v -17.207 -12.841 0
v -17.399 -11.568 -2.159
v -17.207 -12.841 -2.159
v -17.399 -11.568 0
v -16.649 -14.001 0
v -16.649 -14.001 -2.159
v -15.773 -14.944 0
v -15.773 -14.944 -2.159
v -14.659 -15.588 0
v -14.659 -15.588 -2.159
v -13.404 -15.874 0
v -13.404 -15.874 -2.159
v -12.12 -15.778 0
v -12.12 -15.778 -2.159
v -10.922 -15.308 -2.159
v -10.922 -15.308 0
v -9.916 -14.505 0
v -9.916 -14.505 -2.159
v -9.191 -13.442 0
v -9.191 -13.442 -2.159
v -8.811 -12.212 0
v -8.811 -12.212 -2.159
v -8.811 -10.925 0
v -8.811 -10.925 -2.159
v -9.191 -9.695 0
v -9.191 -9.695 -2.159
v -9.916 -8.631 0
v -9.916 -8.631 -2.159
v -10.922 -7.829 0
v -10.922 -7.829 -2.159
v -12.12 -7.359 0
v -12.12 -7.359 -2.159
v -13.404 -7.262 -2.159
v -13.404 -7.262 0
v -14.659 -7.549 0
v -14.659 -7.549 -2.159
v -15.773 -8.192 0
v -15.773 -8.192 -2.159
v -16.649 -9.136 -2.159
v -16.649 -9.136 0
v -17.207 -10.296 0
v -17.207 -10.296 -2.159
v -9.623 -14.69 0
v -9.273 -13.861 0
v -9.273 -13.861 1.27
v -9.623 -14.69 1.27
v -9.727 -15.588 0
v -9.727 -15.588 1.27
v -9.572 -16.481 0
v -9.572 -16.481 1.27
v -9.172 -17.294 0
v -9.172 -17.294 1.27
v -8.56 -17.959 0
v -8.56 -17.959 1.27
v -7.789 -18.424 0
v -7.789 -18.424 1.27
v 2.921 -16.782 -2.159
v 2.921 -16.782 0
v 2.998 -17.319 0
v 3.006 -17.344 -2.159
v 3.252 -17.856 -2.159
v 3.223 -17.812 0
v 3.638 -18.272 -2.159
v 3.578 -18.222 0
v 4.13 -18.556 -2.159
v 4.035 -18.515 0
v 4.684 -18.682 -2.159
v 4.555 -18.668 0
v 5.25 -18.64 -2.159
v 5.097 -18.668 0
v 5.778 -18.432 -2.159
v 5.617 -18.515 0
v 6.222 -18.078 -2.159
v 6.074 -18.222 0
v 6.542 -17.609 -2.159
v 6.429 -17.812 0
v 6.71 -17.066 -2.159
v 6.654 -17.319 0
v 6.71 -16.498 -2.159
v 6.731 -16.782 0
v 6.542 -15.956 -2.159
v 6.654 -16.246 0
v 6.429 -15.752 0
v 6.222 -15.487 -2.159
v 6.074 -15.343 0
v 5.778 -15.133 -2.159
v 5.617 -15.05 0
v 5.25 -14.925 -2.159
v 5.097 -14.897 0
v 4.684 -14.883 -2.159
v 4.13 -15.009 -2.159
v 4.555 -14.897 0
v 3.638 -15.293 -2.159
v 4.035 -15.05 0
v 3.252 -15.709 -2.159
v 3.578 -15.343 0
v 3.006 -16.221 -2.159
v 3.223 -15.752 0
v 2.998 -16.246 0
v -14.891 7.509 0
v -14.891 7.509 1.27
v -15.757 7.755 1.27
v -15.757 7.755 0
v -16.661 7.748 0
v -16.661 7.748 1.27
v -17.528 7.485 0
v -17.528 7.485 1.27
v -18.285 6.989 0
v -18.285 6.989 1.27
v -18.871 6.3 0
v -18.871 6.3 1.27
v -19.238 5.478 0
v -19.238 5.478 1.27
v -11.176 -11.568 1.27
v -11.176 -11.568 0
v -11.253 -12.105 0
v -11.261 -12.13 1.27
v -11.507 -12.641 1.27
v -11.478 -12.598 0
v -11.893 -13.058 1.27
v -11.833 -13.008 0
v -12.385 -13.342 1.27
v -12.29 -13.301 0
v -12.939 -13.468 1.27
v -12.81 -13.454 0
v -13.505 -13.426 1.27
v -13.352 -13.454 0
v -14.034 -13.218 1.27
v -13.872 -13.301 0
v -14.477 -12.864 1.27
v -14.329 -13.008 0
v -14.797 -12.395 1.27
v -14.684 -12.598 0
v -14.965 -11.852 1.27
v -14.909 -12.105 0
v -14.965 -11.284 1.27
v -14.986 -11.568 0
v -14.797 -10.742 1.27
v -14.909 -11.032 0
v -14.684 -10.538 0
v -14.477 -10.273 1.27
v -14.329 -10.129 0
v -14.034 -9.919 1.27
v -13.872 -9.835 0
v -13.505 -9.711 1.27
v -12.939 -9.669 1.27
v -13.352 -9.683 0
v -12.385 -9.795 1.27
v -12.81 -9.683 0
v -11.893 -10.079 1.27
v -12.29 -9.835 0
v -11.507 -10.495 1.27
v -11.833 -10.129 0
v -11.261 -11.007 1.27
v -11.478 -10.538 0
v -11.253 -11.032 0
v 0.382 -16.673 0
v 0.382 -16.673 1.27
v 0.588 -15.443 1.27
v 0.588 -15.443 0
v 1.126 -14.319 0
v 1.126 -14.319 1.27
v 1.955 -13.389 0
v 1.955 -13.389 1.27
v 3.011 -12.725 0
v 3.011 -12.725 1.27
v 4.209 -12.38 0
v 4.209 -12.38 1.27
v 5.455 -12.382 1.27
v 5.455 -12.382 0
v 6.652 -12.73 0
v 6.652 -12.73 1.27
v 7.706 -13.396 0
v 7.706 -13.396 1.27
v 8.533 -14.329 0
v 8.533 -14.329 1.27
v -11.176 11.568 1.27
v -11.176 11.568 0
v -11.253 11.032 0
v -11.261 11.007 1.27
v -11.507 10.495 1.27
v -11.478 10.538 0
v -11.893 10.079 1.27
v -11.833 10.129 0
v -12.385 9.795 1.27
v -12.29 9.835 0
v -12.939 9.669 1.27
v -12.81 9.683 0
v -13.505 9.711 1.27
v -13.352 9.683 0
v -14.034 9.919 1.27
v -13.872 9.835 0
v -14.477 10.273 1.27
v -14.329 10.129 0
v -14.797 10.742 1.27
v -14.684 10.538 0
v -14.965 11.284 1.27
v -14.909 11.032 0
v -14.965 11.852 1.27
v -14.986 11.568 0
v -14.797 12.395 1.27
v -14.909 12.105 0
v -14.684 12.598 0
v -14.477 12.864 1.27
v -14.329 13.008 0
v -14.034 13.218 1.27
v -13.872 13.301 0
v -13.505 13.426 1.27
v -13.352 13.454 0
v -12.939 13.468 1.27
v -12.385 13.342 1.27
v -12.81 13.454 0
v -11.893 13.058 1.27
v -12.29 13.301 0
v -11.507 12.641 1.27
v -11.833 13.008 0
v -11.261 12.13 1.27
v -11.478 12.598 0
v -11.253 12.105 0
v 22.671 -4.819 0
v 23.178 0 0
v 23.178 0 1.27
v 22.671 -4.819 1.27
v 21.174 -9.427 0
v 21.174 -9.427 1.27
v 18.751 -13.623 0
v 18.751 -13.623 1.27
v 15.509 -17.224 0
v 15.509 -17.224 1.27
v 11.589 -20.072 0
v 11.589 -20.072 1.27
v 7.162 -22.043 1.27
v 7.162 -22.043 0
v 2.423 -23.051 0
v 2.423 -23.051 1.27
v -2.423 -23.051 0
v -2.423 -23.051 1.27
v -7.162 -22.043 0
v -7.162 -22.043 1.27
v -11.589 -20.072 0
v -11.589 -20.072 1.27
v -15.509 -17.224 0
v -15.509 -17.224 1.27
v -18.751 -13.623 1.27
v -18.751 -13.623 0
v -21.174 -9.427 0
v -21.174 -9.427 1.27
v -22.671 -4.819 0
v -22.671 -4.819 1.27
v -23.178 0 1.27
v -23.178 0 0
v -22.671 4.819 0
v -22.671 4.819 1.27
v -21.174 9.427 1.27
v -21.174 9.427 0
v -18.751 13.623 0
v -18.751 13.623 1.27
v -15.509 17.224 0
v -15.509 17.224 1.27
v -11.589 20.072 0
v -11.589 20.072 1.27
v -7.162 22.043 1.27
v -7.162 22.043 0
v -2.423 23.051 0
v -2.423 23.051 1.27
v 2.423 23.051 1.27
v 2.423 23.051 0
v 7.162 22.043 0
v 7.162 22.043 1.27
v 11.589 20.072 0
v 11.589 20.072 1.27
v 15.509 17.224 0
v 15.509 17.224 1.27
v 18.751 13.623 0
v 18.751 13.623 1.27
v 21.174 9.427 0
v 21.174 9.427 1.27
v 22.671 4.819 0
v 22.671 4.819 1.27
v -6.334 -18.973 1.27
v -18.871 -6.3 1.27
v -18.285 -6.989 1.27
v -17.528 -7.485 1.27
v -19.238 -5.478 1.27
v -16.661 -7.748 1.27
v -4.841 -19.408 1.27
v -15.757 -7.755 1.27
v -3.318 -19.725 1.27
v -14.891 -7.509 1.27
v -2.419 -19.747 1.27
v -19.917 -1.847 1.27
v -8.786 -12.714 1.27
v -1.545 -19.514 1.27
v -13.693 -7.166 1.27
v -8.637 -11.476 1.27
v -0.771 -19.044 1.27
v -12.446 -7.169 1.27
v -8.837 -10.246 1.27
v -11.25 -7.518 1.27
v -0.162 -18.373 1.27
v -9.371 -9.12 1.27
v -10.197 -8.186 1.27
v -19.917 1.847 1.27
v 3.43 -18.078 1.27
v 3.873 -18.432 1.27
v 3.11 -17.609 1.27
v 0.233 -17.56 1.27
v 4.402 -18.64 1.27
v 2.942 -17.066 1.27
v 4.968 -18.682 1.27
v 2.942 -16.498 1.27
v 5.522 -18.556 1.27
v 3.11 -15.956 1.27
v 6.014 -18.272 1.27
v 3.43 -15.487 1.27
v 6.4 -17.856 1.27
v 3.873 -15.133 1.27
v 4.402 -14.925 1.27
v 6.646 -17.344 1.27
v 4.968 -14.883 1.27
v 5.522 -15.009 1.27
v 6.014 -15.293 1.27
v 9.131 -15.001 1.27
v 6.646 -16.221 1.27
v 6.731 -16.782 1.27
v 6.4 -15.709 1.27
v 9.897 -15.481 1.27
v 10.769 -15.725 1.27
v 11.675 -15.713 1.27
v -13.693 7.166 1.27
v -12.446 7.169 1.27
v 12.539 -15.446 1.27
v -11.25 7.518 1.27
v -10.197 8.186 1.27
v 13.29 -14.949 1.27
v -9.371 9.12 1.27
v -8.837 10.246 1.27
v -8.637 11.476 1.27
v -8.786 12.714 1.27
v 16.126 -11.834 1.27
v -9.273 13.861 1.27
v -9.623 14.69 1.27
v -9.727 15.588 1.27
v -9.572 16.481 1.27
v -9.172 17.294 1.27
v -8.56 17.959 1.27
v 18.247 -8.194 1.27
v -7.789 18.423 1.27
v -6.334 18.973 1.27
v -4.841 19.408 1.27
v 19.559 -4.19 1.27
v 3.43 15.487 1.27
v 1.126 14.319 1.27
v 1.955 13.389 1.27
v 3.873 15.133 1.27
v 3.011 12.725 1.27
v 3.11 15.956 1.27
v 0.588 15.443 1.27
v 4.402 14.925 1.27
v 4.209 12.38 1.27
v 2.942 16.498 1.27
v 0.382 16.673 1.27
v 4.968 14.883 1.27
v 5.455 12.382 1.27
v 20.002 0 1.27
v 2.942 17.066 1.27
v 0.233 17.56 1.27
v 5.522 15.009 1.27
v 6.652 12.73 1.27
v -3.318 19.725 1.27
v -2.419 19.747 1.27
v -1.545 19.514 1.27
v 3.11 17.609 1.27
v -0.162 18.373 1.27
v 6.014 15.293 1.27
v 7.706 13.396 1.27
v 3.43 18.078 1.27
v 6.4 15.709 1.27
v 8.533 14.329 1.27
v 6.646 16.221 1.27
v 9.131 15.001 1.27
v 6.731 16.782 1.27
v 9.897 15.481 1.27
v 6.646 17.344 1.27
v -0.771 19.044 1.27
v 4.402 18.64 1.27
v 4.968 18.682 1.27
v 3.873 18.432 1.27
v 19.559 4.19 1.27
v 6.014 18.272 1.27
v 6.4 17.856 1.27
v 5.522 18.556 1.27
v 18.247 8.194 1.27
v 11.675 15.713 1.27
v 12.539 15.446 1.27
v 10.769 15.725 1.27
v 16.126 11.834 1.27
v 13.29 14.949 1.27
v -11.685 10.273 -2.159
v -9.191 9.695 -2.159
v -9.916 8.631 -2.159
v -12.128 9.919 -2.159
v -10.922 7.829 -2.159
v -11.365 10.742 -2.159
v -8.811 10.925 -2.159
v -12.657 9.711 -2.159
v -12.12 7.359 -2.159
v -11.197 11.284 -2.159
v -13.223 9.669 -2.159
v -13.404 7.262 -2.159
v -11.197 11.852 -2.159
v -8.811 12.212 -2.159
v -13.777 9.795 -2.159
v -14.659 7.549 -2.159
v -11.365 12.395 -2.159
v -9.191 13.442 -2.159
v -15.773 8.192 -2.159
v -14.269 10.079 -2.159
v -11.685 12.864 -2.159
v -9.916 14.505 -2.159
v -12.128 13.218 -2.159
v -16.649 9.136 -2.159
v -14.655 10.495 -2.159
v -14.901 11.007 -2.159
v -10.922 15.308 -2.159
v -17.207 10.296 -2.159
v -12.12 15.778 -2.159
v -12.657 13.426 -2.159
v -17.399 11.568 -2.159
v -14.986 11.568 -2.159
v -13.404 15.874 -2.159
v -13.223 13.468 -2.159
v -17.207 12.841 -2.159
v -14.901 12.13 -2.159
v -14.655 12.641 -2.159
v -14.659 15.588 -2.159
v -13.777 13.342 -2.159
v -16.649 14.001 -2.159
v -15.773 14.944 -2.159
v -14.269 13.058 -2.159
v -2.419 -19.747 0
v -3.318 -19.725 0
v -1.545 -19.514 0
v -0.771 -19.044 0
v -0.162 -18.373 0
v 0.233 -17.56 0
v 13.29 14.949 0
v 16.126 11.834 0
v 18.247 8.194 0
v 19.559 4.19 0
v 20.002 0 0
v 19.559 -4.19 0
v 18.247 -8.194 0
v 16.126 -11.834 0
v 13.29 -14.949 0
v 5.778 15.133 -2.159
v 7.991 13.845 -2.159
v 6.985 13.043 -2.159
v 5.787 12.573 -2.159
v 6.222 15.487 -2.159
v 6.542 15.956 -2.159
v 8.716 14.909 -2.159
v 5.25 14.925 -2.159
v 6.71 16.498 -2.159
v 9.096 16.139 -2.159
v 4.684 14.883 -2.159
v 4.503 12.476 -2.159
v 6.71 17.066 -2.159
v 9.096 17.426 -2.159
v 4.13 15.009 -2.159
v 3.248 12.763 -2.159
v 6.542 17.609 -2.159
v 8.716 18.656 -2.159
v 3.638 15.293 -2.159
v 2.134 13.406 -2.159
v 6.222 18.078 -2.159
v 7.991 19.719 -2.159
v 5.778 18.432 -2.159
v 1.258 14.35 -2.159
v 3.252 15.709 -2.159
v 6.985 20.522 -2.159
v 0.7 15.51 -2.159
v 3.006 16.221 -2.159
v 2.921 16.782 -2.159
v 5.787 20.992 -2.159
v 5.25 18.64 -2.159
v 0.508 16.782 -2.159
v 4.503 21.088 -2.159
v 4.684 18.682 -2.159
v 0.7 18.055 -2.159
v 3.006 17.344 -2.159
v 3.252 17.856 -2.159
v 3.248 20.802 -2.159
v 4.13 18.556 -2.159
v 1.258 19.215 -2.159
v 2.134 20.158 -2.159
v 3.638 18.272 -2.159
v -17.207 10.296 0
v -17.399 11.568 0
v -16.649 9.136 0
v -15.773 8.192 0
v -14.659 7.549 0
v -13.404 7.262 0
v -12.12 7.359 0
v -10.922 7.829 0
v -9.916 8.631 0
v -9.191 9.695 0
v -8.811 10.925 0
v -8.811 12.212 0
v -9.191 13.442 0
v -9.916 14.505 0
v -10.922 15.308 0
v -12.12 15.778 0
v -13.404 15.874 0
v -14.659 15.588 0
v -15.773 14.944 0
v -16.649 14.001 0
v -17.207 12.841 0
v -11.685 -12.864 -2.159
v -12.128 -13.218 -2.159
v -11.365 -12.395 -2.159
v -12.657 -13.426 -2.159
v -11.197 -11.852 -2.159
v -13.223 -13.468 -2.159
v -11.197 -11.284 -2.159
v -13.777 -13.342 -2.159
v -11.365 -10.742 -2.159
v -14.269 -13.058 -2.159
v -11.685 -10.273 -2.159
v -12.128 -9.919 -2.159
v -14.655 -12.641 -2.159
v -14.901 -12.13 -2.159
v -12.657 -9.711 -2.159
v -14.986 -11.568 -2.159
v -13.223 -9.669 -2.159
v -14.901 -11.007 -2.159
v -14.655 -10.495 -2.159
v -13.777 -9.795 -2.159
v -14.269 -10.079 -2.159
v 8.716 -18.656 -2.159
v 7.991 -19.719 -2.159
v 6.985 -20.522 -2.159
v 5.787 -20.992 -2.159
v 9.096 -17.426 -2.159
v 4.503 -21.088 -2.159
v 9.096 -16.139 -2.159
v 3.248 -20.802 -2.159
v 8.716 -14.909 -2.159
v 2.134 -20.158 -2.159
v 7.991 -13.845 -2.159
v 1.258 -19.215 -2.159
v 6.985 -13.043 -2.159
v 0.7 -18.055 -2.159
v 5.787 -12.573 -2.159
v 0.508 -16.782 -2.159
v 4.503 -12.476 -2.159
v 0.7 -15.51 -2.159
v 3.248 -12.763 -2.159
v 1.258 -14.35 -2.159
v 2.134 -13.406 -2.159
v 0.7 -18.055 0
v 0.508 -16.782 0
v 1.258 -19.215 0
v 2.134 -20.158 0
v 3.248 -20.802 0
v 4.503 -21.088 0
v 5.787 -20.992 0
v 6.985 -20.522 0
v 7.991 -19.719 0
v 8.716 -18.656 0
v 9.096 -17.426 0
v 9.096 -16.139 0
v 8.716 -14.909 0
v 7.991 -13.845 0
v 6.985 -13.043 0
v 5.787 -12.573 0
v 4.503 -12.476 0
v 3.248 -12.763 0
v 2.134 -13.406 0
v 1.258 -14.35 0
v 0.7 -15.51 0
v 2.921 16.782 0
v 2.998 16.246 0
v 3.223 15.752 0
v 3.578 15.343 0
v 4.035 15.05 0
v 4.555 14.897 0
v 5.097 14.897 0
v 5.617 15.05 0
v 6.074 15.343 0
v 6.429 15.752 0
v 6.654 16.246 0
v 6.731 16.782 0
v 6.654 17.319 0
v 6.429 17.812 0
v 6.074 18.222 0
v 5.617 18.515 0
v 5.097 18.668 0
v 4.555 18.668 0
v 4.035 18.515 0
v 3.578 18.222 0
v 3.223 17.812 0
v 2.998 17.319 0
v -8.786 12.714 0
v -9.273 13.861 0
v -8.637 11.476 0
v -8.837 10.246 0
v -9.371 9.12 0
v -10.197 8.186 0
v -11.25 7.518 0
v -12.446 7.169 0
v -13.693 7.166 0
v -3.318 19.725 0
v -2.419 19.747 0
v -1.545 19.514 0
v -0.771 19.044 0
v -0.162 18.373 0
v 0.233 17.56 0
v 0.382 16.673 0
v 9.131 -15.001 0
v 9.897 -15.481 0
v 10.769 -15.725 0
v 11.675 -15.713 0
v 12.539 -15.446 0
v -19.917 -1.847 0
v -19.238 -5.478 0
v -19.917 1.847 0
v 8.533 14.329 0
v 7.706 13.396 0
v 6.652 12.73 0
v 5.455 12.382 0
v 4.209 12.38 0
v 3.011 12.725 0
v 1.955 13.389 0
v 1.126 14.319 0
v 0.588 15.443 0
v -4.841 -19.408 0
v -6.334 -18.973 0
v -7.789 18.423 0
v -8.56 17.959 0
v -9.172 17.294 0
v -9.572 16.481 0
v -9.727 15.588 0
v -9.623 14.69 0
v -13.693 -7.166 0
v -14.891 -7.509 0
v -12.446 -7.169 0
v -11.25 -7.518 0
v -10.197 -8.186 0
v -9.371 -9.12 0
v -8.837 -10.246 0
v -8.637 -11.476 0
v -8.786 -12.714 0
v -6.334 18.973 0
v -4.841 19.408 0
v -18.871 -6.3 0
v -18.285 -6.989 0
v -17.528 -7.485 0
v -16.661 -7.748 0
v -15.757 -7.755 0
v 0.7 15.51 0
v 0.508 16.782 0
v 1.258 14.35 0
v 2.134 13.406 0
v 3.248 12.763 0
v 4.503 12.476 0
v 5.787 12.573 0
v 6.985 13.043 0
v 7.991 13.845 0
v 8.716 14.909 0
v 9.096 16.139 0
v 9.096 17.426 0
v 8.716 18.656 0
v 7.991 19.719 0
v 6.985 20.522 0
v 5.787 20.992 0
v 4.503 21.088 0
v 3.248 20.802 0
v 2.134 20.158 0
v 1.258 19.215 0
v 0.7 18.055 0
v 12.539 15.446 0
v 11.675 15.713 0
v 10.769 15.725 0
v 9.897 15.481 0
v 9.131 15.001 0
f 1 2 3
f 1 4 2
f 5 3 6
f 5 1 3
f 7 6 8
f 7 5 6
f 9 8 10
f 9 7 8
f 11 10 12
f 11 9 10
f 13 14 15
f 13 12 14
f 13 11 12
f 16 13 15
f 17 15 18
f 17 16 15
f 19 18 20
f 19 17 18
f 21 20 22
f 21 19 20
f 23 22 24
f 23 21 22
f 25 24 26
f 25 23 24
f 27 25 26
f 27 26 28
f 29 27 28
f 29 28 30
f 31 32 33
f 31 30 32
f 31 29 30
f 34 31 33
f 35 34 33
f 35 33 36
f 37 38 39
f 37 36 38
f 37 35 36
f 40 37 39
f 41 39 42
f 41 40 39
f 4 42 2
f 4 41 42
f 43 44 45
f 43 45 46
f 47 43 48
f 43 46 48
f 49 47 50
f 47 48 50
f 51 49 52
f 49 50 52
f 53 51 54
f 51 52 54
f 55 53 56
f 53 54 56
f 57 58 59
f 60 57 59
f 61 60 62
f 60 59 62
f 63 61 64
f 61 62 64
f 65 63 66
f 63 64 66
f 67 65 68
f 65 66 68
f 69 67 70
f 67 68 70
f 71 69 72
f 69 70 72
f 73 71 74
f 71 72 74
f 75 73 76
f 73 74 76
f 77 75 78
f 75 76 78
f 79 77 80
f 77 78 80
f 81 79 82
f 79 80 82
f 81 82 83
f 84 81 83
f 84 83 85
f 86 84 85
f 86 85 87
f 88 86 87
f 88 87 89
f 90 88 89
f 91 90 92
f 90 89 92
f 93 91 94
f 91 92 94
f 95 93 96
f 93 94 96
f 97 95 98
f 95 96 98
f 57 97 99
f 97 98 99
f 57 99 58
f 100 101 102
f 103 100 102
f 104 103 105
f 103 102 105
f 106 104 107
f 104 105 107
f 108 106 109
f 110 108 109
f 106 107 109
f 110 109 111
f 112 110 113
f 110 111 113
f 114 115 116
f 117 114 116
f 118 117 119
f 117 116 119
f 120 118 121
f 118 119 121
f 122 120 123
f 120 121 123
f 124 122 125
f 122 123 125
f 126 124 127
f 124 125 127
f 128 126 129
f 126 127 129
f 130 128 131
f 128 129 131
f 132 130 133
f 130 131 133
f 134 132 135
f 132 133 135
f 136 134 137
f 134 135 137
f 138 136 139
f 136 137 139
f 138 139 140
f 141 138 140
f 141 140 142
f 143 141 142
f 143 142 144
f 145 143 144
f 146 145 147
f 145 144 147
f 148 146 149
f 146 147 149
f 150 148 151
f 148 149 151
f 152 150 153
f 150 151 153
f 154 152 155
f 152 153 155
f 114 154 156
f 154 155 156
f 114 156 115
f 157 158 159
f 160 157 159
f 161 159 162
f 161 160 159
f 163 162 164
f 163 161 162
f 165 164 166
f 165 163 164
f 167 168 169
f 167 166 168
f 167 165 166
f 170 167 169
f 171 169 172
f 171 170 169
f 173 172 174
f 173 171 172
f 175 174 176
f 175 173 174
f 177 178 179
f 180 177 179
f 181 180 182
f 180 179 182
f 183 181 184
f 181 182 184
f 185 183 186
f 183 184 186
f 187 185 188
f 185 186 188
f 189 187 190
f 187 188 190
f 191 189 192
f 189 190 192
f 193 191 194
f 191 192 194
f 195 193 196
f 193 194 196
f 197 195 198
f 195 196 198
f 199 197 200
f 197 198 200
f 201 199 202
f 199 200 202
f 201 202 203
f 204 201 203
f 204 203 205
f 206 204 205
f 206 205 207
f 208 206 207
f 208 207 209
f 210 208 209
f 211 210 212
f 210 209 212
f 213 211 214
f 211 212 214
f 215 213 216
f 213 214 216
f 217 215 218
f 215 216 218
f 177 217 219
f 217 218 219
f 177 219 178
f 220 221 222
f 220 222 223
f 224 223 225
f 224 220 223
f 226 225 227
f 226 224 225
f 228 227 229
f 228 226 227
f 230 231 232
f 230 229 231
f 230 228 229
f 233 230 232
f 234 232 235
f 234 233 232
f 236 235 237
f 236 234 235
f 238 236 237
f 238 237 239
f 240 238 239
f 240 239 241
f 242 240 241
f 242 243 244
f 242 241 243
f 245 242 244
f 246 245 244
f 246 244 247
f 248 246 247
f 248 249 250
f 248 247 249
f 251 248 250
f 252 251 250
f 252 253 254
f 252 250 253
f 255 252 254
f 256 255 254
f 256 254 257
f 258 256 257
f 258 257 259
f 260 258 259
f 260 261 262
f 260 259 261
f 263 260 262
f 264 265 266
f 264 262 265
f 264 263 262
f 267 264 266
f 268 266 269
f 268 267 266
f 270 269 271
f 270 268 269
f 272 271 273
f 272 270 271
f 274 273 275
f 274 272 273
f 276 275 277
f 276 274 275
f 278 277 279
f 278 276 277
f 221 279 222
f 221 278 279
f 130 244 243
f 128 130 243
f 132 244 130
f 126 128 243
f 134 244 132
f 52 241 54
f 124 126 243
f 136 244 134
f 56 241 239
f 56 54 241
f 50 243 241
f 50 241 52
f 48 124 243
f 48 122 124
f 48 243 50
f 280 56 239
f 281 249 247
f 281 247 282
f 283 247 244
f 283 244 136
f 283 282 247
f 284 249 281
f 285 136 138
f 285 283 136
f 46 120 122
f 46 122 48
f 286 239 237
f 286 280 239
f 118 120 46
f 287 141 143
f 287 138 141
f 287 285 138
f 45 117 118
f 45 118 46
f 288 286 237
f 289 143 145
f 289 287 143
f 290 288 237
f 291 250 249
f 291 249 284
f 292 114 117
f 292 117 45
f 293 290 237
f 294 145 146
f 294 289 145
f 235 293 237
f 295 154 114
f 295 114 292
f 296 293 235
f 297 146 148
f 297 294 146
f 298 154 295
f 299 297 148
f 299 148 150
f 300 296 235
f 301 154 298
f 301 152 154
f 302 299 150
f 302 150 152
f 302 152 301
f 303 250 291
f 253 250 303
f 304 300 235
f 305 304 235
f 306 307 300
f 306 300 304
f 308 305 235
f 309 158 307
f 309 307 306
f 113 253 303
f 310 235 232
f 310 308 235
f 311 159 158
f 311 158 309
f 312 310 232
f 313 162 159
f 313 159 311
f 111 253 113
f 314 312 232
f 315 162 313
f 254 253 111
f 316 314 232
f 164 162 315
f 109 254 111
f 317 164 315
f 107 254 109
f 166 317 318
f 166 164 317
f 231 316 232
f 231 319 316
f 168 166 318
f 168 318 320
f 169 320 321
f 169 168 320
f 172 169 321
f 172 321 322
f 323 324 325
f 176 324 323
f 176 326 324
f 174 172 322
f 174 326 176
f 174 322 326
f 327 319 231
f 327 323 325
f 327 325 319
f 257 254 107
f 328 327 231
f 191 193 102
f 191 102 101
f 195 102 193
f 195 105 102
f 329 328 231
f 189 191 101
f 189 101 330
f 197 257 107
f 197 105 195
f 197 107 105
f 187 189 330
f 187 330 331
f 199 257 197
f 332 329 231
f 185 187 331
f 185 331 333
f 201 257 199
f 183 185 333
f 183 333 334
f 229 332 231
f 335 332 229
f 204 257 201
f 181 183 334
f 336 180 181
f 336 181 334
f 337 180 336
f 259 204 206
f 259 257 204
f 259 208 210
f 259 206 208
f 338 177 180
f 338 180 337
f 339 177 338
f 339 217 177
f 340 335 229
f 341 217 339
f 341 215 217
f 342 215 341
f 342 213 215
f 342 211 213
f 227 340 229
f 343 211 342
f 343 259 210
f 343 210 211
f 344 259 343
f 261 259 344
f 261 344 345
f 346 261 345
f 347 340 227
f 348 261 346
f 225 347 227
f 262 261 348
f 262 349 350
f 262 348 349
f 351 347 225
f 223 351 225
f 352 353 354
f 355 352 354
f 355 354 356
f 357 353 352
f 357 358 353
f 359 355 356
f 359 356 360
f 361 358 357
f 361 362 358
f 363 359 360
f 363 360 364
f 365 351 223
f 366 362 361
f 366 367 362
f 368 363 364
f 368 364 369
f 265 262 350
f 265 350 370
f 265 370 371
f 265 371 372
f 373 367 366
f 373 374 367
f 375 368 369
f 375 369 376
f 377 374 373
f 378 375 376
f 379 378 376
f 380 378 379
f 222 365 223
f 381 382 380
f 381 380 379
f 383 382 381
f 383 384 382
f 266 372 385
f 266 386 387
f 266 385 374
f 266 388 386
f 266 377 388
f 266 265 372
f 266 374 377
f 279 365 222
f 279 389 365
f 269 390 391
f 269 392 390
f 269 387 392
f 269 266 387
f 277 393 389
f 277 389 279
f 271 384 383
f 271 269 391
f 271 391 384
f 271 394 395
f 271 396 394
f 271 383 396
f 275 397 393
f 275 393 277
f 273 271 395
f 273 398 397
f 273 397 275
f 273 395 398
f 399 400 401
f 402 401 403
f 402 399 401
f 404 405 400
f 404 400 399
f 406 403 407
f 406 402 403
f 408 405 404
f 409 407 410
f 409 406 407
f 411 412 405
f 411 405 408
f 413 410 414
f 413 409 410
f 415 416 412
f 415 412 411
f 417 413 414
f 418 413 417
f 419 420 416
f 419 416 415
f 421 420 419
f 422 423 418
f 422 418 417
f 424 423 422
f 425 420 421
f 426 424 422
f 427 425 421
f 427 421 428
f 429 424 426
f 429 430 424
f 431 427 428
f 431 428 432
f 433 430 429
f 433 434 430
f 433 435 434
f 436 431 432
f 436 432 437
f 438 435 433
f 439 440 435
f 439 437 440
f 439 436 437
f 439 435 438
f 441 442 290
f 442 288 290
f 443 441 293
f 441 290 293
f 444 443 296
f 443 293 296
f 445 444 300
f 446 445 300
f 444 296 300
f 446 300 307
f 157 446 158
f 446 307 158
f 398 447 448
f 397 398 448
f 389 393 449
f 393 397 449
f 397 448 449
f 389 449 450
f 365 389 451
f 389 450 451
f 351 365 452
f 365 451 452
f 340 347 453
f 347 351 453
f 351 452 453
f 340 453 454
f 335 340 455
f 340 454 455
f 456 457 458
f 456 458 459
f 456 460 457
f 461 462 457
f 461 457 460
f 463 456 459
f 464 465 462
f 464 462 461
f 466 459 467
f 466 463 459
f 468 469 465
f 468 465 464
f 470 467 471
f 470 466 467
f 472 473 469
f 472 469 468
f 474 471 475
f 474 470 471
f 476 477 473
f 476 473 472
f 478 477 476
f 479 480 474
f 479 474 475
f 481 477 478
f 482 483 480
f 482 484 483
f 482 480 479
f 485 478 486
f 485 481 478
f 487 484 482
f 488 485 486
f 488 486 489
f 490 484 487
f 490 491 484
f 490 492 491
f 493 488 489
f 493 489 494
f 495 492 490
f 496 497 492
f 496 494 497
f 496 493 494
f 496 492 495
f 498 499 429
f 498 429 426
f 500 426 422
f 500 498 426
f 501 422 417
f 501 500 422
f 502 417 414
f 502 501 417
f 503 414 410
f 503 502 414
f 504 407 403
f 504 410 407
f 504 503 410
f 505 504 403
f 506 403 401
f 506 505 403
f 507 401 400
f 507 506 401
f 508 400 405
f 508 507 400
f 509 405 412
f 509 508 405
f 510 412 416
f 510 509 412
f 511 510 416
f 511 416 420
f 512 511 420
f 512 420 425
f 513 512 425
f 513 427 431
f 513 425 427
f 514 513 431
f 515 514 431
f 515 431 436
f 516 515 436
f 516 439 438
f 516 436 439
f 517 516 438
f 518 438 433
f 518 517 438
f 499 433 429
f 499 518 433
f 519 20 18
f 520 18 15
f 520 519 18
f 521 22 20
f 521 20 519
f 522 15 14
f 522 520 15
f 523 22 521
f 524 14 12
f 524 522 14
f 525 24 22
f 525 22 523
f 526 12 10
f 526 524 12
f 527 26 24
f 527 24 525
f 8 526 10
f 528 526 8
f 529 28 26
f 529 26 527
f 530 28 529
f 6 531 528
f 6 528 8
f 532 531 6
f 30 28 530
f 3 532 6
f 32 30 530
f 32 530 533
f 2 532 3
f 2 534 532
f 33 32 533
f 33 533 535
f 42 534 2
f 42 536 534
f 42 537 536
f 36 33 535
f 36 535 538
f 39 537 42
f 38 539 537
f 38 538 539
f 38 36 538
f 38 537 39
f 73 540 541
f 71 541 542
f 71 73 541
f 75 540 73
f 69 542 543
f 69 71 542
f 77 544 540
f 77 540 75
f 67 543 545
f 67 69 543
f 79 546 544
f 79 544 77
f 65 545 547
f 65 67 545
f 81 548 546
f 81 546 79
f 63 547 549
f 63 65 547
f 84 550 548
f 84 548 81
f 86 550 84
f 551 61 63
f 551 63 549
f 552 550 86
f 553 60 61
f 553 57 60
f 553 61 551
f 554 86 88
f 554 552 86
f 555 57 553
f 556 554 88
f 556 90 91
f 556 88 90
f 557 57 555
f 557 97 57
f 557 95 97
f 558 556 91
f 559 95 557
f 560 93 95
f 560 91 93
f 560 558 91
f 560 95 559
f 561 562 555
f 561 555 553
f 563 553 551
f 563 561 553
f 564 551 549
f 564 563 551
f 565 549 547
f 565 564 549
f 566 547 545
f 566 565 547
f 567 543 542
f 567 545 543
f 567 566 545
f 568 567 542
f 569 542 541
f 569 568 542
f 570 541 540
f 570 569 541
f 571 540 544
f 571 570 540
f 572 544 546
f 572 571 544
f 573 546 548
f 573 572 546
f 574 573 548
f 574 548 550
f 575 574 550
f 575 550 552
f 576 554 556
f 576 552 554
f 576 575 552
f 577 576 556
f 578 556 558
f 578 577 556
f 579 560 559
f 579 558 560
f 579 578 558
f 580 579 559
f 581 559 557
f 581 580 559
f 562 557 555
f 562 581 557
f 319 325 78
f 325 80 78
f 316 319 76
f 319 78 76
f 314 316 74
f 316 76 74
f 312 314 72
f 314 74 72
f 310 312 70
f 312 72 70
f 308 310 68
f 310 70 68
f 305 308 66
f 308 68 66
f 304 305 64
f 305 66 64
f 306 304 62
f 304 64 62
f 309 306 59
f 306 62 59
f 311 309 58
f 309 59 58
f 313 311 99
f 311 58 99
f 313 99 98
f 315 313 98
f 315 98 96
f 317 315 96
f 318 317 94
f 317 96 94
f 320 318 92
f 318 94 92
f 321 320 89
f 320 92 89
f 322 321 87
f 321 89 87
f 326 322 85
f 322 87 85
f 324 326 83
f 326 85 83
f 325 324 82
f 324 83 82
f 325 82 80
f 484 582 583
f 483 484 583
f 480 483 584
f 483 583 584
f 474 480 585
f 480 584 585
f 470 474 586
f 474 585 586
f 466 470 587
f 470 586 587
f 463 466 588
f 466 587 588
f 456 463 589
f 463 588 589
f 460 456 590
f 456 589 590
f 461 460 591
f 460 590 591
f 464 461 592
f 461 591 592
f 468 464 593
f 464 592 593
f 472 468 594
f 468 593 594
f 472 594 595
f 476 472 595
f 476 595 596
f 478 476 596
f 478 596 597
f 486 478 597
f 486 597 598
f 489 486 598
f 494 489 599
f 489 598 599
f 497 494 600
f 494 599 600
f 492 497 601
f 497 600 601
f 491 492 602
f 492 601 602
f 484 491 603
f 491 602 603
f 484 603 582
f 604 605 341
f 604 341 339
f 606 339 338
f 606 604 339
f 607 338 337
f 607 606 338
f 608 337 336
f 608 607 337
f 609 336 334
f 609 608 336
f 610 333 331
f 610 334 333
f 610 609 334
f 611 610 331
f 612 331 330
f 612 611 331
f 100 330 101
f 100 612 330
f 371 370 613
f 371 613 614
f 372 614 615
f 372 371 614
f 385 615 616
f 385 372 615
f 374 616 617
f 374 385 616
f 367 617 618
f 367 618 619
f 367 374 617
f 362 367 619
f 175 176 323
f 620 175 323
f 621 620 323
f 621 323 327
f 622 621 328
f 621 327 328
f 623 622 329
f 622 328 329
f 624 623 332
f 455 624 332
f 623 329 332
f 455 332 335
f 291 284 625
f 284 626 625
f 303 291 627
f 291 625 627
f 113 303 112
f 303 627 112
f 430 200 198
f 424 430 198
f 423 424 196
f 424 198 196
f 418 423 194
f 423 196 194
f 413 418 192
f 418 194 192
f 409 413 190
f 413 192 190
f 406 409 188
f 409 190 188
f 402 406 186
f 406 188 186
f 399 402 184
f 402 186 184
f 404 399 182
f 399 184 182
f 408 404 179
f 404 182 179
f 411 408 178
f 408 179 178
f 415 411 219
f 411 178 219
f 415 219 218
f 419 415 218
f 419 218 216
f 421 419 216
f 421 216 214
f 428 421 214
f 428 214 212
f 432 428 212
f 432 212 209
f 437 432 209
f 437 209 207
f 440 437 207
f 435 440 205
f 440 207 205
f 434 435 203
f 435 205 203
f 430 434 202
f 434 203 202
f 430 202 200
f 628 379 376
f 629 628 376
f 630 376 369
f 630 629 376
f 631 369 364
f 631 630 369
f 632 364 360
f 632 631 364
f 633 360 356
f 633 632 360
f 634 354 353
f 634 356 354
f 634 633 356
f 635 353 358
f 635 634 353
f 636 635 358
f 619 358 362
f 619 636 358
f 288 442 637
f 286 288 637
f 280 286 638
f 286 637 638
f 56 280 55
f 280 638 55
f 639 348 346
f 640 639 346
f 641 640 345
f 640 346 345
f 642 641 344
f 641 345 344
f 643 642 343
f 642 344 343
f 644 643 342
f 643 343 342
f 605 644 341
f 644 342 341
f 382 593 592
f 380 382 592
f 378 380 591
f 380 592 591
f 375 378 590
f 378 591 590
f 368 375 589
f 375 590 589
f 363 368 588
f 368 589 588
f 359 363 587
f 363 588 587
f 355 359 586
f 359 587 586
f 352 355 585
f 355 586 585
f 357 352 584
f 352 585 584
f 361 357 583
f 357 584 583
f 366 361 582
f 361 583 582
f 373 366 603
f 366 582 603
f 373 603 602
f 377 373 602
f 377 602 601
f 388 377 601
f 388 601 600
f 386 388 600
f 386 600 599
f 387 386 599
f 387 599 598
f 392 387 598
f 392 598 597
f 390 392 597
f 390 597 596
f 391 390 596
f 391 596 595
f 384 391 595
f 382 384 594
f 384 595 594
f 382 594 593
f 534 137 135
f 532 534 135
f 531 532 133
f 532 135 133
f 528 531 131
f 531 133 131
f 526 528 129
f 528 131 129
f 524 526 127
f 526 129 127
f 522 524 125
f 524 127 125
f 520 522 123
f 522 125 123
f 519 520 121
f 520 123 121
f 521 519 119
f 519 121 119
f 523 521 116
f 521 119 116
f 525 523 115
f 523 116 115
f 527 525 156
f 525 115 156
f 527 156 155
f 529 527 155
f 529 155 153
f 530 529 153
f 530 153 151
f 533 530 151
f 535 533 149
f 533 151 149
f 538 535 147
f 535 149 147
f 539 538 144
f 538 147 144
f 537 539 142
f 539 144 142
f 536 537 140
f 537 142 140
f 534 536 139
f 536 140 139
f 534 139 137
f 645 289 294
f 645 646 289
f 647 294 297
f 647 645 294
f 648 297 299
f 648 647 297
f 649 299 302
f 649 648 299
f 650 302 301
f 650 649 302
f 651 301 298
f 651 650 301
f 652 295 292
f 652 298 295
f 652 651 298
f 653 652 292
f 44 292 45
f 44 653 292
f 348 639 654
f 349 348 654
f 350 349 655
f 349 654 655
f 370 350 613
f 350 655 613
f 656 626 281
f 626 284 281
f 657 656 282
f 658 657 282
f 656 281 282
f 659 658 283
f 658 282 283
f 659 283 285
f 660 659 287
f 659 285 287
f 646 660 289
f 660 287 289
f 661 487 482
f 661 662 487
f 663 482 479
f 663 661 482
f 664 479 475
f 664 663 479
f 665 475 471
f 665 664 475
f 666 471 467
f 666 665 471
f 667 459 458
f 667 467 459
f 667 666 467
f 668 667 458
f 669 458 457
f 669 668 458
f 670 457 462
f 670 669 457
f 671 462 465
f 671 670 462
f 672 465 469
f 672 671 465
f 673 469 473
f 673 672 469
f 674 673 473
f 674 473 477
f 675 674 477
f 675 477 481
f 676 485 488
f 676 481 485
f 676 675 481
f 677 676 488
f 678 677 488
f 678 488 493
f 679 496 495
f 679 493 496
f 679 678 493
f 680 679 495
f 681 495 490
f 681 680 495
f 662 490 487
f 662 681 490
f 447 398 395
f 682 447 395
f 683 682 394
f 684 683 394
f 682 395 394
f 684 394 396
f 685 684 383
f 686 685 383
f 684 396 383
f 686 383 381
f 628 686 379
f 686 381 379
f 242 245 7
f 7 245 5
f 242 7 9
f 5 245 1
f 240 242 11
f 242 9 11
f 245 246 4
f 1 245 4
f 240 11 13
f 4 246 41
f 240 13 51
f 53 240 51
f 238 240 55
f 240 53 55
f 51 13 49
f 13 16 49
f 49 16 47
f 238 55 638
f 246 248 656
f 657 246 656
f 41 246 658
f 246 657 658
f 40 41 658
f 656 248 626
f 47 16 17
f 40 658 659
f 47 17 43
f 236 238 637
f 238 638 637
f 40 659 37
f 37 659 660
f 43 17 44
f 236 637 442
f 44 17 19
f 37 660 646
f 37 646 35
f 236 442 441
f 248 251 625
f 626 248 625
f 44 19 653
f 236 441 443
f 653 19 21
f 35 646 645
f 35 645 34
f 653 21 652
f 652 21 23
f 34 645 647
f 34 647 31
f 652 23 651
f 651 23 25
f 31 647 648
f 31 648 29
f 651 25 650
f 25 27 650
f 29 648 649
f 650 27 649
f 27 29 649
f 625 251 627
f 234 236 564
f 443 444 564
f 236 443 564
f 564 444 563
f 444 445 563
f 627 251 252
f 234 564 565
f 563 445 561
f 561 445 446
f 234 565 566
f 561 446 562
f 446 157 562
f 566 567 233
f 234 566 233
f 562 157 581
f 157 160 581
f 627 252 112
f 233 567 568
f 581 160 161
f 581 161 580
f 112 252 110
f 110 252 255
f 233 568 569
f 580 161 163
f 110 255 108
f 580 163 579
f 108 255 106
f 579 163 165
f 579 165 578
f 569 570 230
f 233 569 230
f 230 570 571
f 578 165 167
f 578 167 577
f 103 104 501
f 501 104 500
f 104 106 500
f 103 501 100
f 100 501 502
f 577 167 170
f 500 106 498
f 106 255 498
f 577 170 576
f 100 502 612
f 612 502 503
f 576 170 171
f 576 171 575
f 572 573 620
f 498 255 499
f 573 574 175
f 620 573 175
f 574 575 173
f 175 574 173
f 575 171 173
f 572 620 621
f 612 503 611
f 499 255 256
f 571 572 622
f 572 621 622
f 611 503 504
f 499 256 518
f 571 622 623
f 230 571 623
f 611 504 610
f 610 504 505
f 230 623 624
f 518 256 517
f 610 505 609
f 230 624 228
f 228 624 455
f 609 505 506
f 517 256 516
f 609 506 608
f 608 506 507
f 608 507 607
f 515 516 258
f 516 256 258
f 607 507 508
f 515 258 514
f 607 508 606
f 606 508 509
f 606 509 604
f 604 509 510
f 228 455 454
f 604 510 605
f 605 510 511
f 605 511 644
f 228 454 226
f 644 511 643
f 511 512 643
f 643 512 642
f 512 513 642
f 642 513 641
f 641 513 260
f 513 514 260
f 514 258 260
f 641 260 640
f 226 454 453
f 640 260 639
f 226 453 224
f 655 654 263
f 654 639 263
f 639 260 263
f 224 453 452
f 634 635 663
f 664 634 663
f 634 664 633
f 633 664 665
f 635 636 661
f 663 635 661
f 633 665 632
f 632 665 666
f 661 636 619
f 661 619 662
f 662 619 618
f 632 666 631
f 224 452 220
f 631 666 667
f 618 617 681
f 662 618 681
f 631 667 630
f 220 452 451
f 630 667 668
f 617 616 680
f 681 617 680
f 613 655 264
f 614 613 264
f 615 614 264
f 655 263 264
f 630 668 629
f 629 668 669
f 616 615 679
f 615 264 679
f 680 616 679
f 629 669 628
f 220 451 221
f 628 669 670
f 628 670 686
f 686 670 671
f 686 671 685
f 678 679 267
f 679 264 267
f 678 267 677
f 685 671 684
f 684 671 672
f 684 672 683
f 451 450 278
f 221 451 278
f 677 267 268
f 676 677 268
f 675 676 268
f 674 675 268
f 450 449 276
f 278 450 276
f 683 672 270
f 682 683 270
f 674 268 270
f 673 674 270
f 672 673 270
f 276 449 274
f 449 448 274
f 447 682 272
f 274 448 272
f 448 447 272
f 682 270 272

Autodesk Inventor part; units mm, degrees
ref_plane "YZ Plane" through (0, 0, 0) normal (1, 0, 0) x (0, 1, 0)
ref_plane "XZ Plane" through (0, 0, 0) normal (0, 1, 0) x (-1, 0, 0)
ref_plane "XY Plane" through (0, 0, 0) normal (0, 0, 1) x (1, 0, 0)
ref_plane "Work Plane1" through (0, 0, 0) normal (0, 0, 1) x (1, 0, 0)
sketch "Sketch1" plane through (0, 0, 0) normal (0, 0, 1) x (1, 0, 0)
  line L0 (-8.3321, -22.7734) -> (-9.471, -25.3313) construction
  line L1 (-9.471, -25.3313) -> (-12.4875, -23.9883) construction
  line L2 (-12.4875, -23.9883) -> (-11.3486, -21.4303) construction
  line L3 (-11.3486, -21.4303) -> (-8.3321, -22.7734) construction
  line L4 (-16.8745, -17.4155) -> (-18.9553, -19.2891) construction
  line L5 (-18.9553, -19.2891) -> (-21.1648, -16.8352) construction
  line L6 (-21.1648, -16.8352) -> (-19.084, -14.9617) construction
  line L7 (-19.084, -14.9617) -> (-16.8745, -17.4155) construction
  line L8 (-22.4992, -9.0464) -> (-25.1622, -9.9116) construction
  line L9 (-25.1622, -9.9116) -> (-26.1825, -6.7713) construction
  line L10 (-26.1825, -6.7713) -> (-23.5196, -5.906) construction
  line L11 (-23.5196, -5.906) -> (-22.4992, -9.0464) construction
  line L12 (-24.2335, 0.887) -> (-27.0182, 1.1796) construction
  line L13 (-27.0182, 1.1796) -> (-26.6731, 4.4635) construction
  line L14 (-26.6731, 4.4635) -> (-23.8884, 4.1709) construction
  line L15 (-23.8884, 4.1709) -> (-24.2335, 0.887) construction
  line L16 (-21.7777, 10.6669) -> (-24.2026, 12.0669) construction
  line L17 (-24.2026, 12.0669) -> (-22.5516, 14.9266) construction
  line L18 (-22.5516, 14.9266) -> (-20.1267, 13.5266) construction
  line L19 (-20.1267, 13.5266) -> (-21.7777, 10.6669) construction
  line L20 (-15.5563, 18.6025) -> (-17.2021, 20.8678) construction
  line L21 (-17.2021, 20.8678) -> (-14.5307, 22.8086) construction
  line L22 (-14.5307, 22.8086) -> (-12.8849, 20.5434) construction
  line L23 (-12.8849, 20.5434) -> (-15.5563, 18.6025) construction
  line L24 (-6.645, 23.3216) -> (-7.2272, 26.0604) construction
  line L25 (-7.2272, 26.0604) -> (-3.9973, 26.7469) construction
  line L26 (-3.9973, 26.7469) -> (-3.4152, 24.0081) construction
  line L27 (-3.4152, 24.0081) -> (-6.645, 23.3216) construction
  line L28 (3.4152, 24.0081) -> (3.9973, 26.7469) construction
  line L29 (3.9973, 26.7469) -> (7.2272, 26.0604) construction
  line L30 (7.2272, 26.0604) -> (6.645, 23.3216) construction
  line L31 (6.645, 23.3216) -> (3.4152, 24.0081) construction
  line L32 (12.8849, 20.5434) -> (14.5307, 22.8086) construction
  line L33 (14.5307, 22.8086) -> (17.2021, 20.8678) construction
  line L34 (17.2021, 20.8678) -> (15.5563, 18.6025) construction
  line L35 (15.5563, 18.6025) -> (12.8849, 20.5434) construction
  line L36 (20.1267, 13.5266) -> (22.5516, 14.9266) construction
  line L37 (22.5516, 14.9266) -> (24.2026, 12.0669) construction
  line L38 (24.2026, 12.0669) -> (21.7777, 10.6669) construction
  line L39 (21.7777, 10.6669) -> (20.1267, 13.5266) construction
  line L40 (23.8884, 4.1709) -> (26.6731, 4.4635) construction
  line L41 (26.6731, 4.4635) -> (27.0182, 1.1796) construction
  line L42 (27.0182, 1.1796) -> (24.2335, 0.887) construction
  line L43 (24.2335, 0.887) -> (23.8884, 4.1709) construction
  line L44 (23.5196, -5.906) -> (26.1825, -6.7713) construction
  line L45 (26.1825, -6.7713) -> (25.1622, -9.9116) construction
  line L46 (25.1622, -9.9116) -> (22.4992, -9.0464) construction
  line L47 (22.4992, -9.0464) -> (23.5196, -5.906) construction
  line L48 (19.084, -14.9617) -> (21.1648, -16.8352) construction
  line L49 (21.1648, -16.8352) -> (18.9553, -19.2891) construction
  line L50 (18.9553, -19.2891) -> (16.8745, -17.4155) construction
  line L51 (16.8745, -17.4155) -> (19.084, -14.9617) construction
  line L52 (11.3486, -21.4303) -> (12.4875, -23.9883) construction
  line L53 (12.4875, -23.9883) -> (9.471, -25.3313) construction
  line L54 (9.471, -25.3313) -> (8.3321, -22.7734) construction
  line L55 (8.3321, -22.7734) -> (11.3486, -21.4303) construction
  line L56 (1.651, -24.1935) -> (1.651, -26.9935) construction
  line L57 (1.651, -26.9935) -> (-1.651, -26.9935) construction
  line L58 (-1.651, -26.9935) -> (-1.651, -24.1935) construction
  line L59 (-1.651, -24.1935) -> (1.651, -24.1935) construction
  circle A0 centre (0, 0) radius 21.9075 construction
  circle A1 centre (0, 0) radius 29.972 construction
  line L60 (-34.3408, 32.385) -> (-34.3408, -32.385) construction
  line L61 (-34.3408, -32.385) -> (15.5702, -32.385) construction
  line L62 (15.5702, -32.385) -> (15.5702, 32.385) construction
  line L63 (15.5702, 32.385) -> (-34.3408, 32.385) construction
  circle A2 centre (-26.2128, 23.749) radius 1.524 construction
  circle A3 centre (6.9342, -23.749) radius 1.524 construction
  line L64 (-2.9845, -10.0203) -> (-2.9845, -9.271) construction
  line L65 (-2.9845, -9.271) -> (-9.271, -9.271) construction
  line L66 (-9.271, -9.271) -> (-9.271, 9.271) construction
  line L67 (-9.271, 9.271) -> (-2.9845, 9.271) construction
  line L68 (-2.9845, 9.271) -> (-2.9845, 10.0203) construction
  arc A4 (2.9845, 10.0203) -> (-2.9845, 10.0203) centre (0, 10.0203) ccw construction
  line L69 (2.9845, 10.0203) -> (2.9845, 9.271) construction
  line L70 (2.9845, 9.271) -> (9.271, 9.271) construction
  line L71 (9.271, 9.271) -> (9.271, -9.271) construction
  line L72 (9.271, -9.271) -> (2.9845, -9.271) construction
  line L73 (2.9845, -9.271) -> (2.9845, -10.0203) construction
  arc A5 (-2.9845, -10.0203) -> (2.9845, -10.0203) centre (0, -10.0203) ccw construction
  circle A6 centre (4.826, 16.7824) radius 1.905
  circle A7 centre (4.826, -16.7824) radius 1.905
  circle A8 centre (-13.081, 11.5683) radius 1.905
  circle A9 centre (-13.081, -11.5683) radius 1.905
  circle A10 centre (0, 0) radius 23.1775
  arc A11 (1.6885, 19.9311) -> (9.1568, 17.7835) centre (4.826, 16.7824) ccw
  arc A12 (9.1568, -17.7835) -> (1.6885, -19.9311) centre (4.826, -16.7824) ccw
  arc A13 (-12.1243, -15.9092) -> (-17.2723, -10.088) centre (-13.081, -11.5683) ccw
  arc A14 (-17.2723, 10.088) -> (-12.1243, 15.9092) centre (-13.081, 11.5683) ccw
  arc A15 (-12.1243, -15.9092) -> (1.6885, -19.9311) centre (0, 0) ccw
  arc A16 (-17.2723, 10.088) -> (-17.2723, -10.088) centre (0, 0) ccw
  arc A17 (9.1568, -17.7835) -> (9.1568, 17.7835) centre (0, 0) ccw
  arc A18 (1.6885, 19.9311) -> (-12.1243, 15.9092) centre (0, 0) ccw
  dimension "d0" = 2.54
  dimension "d1" = 2.54
  dimension "d2" = 2.54
  dimension "d3" = 2.54
  dimension "d4" = 3.81
  dimension "d5" = 2.54
  dimension "d6" = 3.81
  dimension "d7" = 1.27
  dimension "d9" = 2.54
  dimension "d10" = 3.175
  dimension "d11" = 3.175
  dimension "d12" = 3.175
  dimension "d13" = 3.175
extrude "Extrusion1" add sketch "Sketch1" along normal blind 1.27
fillet "Fillet1" radius 3.175 8 edges at (9.1568, 17.7835, 0.635) (1.6885, 19.9311, 0.635) (-12.1243, 15.9092, 0.635) (-17.2723, 10.088, 0.635) (9.1568, -17.7835, 0.635) (1.6885, -19.9311, 0.635) (-12.1243, -15.9092, 0.635) (-17.2723, -10.088, 0.635)
sketch "Sketch2" plane through (0, 0, 0) normal (0, 0, -1) x (-1, 0, 0)
  circle A0 centre (13.081, -11.5683) radius 1.905 projected
  circle A1 centre (13.081, 11.5683) radius 1.905 projected
  circle A2 centre (-4.826, -16.7824) radius 1.905 projected
  circle A3 centre (-4.826, 16.7824) radius 1.905 projected
  circle A4 centre (-4.826, -16.7824) radius 4.318
  circle A5 centre (-4.826, 16.7824) radius 1.905 projected
  circle A6 centre (-4.826, 16.7824) radius 4.318
  circle A7 centre (13.081, -11.5683) radius 1.905 projected
  circle A8 centre (13.081, -11.5683) radius 4.318
  circle A9 centre (13.081, 11.5683) radius 4.318
  circle A10 centre (0, 0) radius 21.9075 construction
  dimension "d17" = 0.127
extrude "Extrusion2" add sketch "Sketch2" along normal blind 2.159
equation "\"d1\" = d0"
equation "\"d2\" = d1"
equation "\"d3\" = d0"
properties part number "Ring Front"
